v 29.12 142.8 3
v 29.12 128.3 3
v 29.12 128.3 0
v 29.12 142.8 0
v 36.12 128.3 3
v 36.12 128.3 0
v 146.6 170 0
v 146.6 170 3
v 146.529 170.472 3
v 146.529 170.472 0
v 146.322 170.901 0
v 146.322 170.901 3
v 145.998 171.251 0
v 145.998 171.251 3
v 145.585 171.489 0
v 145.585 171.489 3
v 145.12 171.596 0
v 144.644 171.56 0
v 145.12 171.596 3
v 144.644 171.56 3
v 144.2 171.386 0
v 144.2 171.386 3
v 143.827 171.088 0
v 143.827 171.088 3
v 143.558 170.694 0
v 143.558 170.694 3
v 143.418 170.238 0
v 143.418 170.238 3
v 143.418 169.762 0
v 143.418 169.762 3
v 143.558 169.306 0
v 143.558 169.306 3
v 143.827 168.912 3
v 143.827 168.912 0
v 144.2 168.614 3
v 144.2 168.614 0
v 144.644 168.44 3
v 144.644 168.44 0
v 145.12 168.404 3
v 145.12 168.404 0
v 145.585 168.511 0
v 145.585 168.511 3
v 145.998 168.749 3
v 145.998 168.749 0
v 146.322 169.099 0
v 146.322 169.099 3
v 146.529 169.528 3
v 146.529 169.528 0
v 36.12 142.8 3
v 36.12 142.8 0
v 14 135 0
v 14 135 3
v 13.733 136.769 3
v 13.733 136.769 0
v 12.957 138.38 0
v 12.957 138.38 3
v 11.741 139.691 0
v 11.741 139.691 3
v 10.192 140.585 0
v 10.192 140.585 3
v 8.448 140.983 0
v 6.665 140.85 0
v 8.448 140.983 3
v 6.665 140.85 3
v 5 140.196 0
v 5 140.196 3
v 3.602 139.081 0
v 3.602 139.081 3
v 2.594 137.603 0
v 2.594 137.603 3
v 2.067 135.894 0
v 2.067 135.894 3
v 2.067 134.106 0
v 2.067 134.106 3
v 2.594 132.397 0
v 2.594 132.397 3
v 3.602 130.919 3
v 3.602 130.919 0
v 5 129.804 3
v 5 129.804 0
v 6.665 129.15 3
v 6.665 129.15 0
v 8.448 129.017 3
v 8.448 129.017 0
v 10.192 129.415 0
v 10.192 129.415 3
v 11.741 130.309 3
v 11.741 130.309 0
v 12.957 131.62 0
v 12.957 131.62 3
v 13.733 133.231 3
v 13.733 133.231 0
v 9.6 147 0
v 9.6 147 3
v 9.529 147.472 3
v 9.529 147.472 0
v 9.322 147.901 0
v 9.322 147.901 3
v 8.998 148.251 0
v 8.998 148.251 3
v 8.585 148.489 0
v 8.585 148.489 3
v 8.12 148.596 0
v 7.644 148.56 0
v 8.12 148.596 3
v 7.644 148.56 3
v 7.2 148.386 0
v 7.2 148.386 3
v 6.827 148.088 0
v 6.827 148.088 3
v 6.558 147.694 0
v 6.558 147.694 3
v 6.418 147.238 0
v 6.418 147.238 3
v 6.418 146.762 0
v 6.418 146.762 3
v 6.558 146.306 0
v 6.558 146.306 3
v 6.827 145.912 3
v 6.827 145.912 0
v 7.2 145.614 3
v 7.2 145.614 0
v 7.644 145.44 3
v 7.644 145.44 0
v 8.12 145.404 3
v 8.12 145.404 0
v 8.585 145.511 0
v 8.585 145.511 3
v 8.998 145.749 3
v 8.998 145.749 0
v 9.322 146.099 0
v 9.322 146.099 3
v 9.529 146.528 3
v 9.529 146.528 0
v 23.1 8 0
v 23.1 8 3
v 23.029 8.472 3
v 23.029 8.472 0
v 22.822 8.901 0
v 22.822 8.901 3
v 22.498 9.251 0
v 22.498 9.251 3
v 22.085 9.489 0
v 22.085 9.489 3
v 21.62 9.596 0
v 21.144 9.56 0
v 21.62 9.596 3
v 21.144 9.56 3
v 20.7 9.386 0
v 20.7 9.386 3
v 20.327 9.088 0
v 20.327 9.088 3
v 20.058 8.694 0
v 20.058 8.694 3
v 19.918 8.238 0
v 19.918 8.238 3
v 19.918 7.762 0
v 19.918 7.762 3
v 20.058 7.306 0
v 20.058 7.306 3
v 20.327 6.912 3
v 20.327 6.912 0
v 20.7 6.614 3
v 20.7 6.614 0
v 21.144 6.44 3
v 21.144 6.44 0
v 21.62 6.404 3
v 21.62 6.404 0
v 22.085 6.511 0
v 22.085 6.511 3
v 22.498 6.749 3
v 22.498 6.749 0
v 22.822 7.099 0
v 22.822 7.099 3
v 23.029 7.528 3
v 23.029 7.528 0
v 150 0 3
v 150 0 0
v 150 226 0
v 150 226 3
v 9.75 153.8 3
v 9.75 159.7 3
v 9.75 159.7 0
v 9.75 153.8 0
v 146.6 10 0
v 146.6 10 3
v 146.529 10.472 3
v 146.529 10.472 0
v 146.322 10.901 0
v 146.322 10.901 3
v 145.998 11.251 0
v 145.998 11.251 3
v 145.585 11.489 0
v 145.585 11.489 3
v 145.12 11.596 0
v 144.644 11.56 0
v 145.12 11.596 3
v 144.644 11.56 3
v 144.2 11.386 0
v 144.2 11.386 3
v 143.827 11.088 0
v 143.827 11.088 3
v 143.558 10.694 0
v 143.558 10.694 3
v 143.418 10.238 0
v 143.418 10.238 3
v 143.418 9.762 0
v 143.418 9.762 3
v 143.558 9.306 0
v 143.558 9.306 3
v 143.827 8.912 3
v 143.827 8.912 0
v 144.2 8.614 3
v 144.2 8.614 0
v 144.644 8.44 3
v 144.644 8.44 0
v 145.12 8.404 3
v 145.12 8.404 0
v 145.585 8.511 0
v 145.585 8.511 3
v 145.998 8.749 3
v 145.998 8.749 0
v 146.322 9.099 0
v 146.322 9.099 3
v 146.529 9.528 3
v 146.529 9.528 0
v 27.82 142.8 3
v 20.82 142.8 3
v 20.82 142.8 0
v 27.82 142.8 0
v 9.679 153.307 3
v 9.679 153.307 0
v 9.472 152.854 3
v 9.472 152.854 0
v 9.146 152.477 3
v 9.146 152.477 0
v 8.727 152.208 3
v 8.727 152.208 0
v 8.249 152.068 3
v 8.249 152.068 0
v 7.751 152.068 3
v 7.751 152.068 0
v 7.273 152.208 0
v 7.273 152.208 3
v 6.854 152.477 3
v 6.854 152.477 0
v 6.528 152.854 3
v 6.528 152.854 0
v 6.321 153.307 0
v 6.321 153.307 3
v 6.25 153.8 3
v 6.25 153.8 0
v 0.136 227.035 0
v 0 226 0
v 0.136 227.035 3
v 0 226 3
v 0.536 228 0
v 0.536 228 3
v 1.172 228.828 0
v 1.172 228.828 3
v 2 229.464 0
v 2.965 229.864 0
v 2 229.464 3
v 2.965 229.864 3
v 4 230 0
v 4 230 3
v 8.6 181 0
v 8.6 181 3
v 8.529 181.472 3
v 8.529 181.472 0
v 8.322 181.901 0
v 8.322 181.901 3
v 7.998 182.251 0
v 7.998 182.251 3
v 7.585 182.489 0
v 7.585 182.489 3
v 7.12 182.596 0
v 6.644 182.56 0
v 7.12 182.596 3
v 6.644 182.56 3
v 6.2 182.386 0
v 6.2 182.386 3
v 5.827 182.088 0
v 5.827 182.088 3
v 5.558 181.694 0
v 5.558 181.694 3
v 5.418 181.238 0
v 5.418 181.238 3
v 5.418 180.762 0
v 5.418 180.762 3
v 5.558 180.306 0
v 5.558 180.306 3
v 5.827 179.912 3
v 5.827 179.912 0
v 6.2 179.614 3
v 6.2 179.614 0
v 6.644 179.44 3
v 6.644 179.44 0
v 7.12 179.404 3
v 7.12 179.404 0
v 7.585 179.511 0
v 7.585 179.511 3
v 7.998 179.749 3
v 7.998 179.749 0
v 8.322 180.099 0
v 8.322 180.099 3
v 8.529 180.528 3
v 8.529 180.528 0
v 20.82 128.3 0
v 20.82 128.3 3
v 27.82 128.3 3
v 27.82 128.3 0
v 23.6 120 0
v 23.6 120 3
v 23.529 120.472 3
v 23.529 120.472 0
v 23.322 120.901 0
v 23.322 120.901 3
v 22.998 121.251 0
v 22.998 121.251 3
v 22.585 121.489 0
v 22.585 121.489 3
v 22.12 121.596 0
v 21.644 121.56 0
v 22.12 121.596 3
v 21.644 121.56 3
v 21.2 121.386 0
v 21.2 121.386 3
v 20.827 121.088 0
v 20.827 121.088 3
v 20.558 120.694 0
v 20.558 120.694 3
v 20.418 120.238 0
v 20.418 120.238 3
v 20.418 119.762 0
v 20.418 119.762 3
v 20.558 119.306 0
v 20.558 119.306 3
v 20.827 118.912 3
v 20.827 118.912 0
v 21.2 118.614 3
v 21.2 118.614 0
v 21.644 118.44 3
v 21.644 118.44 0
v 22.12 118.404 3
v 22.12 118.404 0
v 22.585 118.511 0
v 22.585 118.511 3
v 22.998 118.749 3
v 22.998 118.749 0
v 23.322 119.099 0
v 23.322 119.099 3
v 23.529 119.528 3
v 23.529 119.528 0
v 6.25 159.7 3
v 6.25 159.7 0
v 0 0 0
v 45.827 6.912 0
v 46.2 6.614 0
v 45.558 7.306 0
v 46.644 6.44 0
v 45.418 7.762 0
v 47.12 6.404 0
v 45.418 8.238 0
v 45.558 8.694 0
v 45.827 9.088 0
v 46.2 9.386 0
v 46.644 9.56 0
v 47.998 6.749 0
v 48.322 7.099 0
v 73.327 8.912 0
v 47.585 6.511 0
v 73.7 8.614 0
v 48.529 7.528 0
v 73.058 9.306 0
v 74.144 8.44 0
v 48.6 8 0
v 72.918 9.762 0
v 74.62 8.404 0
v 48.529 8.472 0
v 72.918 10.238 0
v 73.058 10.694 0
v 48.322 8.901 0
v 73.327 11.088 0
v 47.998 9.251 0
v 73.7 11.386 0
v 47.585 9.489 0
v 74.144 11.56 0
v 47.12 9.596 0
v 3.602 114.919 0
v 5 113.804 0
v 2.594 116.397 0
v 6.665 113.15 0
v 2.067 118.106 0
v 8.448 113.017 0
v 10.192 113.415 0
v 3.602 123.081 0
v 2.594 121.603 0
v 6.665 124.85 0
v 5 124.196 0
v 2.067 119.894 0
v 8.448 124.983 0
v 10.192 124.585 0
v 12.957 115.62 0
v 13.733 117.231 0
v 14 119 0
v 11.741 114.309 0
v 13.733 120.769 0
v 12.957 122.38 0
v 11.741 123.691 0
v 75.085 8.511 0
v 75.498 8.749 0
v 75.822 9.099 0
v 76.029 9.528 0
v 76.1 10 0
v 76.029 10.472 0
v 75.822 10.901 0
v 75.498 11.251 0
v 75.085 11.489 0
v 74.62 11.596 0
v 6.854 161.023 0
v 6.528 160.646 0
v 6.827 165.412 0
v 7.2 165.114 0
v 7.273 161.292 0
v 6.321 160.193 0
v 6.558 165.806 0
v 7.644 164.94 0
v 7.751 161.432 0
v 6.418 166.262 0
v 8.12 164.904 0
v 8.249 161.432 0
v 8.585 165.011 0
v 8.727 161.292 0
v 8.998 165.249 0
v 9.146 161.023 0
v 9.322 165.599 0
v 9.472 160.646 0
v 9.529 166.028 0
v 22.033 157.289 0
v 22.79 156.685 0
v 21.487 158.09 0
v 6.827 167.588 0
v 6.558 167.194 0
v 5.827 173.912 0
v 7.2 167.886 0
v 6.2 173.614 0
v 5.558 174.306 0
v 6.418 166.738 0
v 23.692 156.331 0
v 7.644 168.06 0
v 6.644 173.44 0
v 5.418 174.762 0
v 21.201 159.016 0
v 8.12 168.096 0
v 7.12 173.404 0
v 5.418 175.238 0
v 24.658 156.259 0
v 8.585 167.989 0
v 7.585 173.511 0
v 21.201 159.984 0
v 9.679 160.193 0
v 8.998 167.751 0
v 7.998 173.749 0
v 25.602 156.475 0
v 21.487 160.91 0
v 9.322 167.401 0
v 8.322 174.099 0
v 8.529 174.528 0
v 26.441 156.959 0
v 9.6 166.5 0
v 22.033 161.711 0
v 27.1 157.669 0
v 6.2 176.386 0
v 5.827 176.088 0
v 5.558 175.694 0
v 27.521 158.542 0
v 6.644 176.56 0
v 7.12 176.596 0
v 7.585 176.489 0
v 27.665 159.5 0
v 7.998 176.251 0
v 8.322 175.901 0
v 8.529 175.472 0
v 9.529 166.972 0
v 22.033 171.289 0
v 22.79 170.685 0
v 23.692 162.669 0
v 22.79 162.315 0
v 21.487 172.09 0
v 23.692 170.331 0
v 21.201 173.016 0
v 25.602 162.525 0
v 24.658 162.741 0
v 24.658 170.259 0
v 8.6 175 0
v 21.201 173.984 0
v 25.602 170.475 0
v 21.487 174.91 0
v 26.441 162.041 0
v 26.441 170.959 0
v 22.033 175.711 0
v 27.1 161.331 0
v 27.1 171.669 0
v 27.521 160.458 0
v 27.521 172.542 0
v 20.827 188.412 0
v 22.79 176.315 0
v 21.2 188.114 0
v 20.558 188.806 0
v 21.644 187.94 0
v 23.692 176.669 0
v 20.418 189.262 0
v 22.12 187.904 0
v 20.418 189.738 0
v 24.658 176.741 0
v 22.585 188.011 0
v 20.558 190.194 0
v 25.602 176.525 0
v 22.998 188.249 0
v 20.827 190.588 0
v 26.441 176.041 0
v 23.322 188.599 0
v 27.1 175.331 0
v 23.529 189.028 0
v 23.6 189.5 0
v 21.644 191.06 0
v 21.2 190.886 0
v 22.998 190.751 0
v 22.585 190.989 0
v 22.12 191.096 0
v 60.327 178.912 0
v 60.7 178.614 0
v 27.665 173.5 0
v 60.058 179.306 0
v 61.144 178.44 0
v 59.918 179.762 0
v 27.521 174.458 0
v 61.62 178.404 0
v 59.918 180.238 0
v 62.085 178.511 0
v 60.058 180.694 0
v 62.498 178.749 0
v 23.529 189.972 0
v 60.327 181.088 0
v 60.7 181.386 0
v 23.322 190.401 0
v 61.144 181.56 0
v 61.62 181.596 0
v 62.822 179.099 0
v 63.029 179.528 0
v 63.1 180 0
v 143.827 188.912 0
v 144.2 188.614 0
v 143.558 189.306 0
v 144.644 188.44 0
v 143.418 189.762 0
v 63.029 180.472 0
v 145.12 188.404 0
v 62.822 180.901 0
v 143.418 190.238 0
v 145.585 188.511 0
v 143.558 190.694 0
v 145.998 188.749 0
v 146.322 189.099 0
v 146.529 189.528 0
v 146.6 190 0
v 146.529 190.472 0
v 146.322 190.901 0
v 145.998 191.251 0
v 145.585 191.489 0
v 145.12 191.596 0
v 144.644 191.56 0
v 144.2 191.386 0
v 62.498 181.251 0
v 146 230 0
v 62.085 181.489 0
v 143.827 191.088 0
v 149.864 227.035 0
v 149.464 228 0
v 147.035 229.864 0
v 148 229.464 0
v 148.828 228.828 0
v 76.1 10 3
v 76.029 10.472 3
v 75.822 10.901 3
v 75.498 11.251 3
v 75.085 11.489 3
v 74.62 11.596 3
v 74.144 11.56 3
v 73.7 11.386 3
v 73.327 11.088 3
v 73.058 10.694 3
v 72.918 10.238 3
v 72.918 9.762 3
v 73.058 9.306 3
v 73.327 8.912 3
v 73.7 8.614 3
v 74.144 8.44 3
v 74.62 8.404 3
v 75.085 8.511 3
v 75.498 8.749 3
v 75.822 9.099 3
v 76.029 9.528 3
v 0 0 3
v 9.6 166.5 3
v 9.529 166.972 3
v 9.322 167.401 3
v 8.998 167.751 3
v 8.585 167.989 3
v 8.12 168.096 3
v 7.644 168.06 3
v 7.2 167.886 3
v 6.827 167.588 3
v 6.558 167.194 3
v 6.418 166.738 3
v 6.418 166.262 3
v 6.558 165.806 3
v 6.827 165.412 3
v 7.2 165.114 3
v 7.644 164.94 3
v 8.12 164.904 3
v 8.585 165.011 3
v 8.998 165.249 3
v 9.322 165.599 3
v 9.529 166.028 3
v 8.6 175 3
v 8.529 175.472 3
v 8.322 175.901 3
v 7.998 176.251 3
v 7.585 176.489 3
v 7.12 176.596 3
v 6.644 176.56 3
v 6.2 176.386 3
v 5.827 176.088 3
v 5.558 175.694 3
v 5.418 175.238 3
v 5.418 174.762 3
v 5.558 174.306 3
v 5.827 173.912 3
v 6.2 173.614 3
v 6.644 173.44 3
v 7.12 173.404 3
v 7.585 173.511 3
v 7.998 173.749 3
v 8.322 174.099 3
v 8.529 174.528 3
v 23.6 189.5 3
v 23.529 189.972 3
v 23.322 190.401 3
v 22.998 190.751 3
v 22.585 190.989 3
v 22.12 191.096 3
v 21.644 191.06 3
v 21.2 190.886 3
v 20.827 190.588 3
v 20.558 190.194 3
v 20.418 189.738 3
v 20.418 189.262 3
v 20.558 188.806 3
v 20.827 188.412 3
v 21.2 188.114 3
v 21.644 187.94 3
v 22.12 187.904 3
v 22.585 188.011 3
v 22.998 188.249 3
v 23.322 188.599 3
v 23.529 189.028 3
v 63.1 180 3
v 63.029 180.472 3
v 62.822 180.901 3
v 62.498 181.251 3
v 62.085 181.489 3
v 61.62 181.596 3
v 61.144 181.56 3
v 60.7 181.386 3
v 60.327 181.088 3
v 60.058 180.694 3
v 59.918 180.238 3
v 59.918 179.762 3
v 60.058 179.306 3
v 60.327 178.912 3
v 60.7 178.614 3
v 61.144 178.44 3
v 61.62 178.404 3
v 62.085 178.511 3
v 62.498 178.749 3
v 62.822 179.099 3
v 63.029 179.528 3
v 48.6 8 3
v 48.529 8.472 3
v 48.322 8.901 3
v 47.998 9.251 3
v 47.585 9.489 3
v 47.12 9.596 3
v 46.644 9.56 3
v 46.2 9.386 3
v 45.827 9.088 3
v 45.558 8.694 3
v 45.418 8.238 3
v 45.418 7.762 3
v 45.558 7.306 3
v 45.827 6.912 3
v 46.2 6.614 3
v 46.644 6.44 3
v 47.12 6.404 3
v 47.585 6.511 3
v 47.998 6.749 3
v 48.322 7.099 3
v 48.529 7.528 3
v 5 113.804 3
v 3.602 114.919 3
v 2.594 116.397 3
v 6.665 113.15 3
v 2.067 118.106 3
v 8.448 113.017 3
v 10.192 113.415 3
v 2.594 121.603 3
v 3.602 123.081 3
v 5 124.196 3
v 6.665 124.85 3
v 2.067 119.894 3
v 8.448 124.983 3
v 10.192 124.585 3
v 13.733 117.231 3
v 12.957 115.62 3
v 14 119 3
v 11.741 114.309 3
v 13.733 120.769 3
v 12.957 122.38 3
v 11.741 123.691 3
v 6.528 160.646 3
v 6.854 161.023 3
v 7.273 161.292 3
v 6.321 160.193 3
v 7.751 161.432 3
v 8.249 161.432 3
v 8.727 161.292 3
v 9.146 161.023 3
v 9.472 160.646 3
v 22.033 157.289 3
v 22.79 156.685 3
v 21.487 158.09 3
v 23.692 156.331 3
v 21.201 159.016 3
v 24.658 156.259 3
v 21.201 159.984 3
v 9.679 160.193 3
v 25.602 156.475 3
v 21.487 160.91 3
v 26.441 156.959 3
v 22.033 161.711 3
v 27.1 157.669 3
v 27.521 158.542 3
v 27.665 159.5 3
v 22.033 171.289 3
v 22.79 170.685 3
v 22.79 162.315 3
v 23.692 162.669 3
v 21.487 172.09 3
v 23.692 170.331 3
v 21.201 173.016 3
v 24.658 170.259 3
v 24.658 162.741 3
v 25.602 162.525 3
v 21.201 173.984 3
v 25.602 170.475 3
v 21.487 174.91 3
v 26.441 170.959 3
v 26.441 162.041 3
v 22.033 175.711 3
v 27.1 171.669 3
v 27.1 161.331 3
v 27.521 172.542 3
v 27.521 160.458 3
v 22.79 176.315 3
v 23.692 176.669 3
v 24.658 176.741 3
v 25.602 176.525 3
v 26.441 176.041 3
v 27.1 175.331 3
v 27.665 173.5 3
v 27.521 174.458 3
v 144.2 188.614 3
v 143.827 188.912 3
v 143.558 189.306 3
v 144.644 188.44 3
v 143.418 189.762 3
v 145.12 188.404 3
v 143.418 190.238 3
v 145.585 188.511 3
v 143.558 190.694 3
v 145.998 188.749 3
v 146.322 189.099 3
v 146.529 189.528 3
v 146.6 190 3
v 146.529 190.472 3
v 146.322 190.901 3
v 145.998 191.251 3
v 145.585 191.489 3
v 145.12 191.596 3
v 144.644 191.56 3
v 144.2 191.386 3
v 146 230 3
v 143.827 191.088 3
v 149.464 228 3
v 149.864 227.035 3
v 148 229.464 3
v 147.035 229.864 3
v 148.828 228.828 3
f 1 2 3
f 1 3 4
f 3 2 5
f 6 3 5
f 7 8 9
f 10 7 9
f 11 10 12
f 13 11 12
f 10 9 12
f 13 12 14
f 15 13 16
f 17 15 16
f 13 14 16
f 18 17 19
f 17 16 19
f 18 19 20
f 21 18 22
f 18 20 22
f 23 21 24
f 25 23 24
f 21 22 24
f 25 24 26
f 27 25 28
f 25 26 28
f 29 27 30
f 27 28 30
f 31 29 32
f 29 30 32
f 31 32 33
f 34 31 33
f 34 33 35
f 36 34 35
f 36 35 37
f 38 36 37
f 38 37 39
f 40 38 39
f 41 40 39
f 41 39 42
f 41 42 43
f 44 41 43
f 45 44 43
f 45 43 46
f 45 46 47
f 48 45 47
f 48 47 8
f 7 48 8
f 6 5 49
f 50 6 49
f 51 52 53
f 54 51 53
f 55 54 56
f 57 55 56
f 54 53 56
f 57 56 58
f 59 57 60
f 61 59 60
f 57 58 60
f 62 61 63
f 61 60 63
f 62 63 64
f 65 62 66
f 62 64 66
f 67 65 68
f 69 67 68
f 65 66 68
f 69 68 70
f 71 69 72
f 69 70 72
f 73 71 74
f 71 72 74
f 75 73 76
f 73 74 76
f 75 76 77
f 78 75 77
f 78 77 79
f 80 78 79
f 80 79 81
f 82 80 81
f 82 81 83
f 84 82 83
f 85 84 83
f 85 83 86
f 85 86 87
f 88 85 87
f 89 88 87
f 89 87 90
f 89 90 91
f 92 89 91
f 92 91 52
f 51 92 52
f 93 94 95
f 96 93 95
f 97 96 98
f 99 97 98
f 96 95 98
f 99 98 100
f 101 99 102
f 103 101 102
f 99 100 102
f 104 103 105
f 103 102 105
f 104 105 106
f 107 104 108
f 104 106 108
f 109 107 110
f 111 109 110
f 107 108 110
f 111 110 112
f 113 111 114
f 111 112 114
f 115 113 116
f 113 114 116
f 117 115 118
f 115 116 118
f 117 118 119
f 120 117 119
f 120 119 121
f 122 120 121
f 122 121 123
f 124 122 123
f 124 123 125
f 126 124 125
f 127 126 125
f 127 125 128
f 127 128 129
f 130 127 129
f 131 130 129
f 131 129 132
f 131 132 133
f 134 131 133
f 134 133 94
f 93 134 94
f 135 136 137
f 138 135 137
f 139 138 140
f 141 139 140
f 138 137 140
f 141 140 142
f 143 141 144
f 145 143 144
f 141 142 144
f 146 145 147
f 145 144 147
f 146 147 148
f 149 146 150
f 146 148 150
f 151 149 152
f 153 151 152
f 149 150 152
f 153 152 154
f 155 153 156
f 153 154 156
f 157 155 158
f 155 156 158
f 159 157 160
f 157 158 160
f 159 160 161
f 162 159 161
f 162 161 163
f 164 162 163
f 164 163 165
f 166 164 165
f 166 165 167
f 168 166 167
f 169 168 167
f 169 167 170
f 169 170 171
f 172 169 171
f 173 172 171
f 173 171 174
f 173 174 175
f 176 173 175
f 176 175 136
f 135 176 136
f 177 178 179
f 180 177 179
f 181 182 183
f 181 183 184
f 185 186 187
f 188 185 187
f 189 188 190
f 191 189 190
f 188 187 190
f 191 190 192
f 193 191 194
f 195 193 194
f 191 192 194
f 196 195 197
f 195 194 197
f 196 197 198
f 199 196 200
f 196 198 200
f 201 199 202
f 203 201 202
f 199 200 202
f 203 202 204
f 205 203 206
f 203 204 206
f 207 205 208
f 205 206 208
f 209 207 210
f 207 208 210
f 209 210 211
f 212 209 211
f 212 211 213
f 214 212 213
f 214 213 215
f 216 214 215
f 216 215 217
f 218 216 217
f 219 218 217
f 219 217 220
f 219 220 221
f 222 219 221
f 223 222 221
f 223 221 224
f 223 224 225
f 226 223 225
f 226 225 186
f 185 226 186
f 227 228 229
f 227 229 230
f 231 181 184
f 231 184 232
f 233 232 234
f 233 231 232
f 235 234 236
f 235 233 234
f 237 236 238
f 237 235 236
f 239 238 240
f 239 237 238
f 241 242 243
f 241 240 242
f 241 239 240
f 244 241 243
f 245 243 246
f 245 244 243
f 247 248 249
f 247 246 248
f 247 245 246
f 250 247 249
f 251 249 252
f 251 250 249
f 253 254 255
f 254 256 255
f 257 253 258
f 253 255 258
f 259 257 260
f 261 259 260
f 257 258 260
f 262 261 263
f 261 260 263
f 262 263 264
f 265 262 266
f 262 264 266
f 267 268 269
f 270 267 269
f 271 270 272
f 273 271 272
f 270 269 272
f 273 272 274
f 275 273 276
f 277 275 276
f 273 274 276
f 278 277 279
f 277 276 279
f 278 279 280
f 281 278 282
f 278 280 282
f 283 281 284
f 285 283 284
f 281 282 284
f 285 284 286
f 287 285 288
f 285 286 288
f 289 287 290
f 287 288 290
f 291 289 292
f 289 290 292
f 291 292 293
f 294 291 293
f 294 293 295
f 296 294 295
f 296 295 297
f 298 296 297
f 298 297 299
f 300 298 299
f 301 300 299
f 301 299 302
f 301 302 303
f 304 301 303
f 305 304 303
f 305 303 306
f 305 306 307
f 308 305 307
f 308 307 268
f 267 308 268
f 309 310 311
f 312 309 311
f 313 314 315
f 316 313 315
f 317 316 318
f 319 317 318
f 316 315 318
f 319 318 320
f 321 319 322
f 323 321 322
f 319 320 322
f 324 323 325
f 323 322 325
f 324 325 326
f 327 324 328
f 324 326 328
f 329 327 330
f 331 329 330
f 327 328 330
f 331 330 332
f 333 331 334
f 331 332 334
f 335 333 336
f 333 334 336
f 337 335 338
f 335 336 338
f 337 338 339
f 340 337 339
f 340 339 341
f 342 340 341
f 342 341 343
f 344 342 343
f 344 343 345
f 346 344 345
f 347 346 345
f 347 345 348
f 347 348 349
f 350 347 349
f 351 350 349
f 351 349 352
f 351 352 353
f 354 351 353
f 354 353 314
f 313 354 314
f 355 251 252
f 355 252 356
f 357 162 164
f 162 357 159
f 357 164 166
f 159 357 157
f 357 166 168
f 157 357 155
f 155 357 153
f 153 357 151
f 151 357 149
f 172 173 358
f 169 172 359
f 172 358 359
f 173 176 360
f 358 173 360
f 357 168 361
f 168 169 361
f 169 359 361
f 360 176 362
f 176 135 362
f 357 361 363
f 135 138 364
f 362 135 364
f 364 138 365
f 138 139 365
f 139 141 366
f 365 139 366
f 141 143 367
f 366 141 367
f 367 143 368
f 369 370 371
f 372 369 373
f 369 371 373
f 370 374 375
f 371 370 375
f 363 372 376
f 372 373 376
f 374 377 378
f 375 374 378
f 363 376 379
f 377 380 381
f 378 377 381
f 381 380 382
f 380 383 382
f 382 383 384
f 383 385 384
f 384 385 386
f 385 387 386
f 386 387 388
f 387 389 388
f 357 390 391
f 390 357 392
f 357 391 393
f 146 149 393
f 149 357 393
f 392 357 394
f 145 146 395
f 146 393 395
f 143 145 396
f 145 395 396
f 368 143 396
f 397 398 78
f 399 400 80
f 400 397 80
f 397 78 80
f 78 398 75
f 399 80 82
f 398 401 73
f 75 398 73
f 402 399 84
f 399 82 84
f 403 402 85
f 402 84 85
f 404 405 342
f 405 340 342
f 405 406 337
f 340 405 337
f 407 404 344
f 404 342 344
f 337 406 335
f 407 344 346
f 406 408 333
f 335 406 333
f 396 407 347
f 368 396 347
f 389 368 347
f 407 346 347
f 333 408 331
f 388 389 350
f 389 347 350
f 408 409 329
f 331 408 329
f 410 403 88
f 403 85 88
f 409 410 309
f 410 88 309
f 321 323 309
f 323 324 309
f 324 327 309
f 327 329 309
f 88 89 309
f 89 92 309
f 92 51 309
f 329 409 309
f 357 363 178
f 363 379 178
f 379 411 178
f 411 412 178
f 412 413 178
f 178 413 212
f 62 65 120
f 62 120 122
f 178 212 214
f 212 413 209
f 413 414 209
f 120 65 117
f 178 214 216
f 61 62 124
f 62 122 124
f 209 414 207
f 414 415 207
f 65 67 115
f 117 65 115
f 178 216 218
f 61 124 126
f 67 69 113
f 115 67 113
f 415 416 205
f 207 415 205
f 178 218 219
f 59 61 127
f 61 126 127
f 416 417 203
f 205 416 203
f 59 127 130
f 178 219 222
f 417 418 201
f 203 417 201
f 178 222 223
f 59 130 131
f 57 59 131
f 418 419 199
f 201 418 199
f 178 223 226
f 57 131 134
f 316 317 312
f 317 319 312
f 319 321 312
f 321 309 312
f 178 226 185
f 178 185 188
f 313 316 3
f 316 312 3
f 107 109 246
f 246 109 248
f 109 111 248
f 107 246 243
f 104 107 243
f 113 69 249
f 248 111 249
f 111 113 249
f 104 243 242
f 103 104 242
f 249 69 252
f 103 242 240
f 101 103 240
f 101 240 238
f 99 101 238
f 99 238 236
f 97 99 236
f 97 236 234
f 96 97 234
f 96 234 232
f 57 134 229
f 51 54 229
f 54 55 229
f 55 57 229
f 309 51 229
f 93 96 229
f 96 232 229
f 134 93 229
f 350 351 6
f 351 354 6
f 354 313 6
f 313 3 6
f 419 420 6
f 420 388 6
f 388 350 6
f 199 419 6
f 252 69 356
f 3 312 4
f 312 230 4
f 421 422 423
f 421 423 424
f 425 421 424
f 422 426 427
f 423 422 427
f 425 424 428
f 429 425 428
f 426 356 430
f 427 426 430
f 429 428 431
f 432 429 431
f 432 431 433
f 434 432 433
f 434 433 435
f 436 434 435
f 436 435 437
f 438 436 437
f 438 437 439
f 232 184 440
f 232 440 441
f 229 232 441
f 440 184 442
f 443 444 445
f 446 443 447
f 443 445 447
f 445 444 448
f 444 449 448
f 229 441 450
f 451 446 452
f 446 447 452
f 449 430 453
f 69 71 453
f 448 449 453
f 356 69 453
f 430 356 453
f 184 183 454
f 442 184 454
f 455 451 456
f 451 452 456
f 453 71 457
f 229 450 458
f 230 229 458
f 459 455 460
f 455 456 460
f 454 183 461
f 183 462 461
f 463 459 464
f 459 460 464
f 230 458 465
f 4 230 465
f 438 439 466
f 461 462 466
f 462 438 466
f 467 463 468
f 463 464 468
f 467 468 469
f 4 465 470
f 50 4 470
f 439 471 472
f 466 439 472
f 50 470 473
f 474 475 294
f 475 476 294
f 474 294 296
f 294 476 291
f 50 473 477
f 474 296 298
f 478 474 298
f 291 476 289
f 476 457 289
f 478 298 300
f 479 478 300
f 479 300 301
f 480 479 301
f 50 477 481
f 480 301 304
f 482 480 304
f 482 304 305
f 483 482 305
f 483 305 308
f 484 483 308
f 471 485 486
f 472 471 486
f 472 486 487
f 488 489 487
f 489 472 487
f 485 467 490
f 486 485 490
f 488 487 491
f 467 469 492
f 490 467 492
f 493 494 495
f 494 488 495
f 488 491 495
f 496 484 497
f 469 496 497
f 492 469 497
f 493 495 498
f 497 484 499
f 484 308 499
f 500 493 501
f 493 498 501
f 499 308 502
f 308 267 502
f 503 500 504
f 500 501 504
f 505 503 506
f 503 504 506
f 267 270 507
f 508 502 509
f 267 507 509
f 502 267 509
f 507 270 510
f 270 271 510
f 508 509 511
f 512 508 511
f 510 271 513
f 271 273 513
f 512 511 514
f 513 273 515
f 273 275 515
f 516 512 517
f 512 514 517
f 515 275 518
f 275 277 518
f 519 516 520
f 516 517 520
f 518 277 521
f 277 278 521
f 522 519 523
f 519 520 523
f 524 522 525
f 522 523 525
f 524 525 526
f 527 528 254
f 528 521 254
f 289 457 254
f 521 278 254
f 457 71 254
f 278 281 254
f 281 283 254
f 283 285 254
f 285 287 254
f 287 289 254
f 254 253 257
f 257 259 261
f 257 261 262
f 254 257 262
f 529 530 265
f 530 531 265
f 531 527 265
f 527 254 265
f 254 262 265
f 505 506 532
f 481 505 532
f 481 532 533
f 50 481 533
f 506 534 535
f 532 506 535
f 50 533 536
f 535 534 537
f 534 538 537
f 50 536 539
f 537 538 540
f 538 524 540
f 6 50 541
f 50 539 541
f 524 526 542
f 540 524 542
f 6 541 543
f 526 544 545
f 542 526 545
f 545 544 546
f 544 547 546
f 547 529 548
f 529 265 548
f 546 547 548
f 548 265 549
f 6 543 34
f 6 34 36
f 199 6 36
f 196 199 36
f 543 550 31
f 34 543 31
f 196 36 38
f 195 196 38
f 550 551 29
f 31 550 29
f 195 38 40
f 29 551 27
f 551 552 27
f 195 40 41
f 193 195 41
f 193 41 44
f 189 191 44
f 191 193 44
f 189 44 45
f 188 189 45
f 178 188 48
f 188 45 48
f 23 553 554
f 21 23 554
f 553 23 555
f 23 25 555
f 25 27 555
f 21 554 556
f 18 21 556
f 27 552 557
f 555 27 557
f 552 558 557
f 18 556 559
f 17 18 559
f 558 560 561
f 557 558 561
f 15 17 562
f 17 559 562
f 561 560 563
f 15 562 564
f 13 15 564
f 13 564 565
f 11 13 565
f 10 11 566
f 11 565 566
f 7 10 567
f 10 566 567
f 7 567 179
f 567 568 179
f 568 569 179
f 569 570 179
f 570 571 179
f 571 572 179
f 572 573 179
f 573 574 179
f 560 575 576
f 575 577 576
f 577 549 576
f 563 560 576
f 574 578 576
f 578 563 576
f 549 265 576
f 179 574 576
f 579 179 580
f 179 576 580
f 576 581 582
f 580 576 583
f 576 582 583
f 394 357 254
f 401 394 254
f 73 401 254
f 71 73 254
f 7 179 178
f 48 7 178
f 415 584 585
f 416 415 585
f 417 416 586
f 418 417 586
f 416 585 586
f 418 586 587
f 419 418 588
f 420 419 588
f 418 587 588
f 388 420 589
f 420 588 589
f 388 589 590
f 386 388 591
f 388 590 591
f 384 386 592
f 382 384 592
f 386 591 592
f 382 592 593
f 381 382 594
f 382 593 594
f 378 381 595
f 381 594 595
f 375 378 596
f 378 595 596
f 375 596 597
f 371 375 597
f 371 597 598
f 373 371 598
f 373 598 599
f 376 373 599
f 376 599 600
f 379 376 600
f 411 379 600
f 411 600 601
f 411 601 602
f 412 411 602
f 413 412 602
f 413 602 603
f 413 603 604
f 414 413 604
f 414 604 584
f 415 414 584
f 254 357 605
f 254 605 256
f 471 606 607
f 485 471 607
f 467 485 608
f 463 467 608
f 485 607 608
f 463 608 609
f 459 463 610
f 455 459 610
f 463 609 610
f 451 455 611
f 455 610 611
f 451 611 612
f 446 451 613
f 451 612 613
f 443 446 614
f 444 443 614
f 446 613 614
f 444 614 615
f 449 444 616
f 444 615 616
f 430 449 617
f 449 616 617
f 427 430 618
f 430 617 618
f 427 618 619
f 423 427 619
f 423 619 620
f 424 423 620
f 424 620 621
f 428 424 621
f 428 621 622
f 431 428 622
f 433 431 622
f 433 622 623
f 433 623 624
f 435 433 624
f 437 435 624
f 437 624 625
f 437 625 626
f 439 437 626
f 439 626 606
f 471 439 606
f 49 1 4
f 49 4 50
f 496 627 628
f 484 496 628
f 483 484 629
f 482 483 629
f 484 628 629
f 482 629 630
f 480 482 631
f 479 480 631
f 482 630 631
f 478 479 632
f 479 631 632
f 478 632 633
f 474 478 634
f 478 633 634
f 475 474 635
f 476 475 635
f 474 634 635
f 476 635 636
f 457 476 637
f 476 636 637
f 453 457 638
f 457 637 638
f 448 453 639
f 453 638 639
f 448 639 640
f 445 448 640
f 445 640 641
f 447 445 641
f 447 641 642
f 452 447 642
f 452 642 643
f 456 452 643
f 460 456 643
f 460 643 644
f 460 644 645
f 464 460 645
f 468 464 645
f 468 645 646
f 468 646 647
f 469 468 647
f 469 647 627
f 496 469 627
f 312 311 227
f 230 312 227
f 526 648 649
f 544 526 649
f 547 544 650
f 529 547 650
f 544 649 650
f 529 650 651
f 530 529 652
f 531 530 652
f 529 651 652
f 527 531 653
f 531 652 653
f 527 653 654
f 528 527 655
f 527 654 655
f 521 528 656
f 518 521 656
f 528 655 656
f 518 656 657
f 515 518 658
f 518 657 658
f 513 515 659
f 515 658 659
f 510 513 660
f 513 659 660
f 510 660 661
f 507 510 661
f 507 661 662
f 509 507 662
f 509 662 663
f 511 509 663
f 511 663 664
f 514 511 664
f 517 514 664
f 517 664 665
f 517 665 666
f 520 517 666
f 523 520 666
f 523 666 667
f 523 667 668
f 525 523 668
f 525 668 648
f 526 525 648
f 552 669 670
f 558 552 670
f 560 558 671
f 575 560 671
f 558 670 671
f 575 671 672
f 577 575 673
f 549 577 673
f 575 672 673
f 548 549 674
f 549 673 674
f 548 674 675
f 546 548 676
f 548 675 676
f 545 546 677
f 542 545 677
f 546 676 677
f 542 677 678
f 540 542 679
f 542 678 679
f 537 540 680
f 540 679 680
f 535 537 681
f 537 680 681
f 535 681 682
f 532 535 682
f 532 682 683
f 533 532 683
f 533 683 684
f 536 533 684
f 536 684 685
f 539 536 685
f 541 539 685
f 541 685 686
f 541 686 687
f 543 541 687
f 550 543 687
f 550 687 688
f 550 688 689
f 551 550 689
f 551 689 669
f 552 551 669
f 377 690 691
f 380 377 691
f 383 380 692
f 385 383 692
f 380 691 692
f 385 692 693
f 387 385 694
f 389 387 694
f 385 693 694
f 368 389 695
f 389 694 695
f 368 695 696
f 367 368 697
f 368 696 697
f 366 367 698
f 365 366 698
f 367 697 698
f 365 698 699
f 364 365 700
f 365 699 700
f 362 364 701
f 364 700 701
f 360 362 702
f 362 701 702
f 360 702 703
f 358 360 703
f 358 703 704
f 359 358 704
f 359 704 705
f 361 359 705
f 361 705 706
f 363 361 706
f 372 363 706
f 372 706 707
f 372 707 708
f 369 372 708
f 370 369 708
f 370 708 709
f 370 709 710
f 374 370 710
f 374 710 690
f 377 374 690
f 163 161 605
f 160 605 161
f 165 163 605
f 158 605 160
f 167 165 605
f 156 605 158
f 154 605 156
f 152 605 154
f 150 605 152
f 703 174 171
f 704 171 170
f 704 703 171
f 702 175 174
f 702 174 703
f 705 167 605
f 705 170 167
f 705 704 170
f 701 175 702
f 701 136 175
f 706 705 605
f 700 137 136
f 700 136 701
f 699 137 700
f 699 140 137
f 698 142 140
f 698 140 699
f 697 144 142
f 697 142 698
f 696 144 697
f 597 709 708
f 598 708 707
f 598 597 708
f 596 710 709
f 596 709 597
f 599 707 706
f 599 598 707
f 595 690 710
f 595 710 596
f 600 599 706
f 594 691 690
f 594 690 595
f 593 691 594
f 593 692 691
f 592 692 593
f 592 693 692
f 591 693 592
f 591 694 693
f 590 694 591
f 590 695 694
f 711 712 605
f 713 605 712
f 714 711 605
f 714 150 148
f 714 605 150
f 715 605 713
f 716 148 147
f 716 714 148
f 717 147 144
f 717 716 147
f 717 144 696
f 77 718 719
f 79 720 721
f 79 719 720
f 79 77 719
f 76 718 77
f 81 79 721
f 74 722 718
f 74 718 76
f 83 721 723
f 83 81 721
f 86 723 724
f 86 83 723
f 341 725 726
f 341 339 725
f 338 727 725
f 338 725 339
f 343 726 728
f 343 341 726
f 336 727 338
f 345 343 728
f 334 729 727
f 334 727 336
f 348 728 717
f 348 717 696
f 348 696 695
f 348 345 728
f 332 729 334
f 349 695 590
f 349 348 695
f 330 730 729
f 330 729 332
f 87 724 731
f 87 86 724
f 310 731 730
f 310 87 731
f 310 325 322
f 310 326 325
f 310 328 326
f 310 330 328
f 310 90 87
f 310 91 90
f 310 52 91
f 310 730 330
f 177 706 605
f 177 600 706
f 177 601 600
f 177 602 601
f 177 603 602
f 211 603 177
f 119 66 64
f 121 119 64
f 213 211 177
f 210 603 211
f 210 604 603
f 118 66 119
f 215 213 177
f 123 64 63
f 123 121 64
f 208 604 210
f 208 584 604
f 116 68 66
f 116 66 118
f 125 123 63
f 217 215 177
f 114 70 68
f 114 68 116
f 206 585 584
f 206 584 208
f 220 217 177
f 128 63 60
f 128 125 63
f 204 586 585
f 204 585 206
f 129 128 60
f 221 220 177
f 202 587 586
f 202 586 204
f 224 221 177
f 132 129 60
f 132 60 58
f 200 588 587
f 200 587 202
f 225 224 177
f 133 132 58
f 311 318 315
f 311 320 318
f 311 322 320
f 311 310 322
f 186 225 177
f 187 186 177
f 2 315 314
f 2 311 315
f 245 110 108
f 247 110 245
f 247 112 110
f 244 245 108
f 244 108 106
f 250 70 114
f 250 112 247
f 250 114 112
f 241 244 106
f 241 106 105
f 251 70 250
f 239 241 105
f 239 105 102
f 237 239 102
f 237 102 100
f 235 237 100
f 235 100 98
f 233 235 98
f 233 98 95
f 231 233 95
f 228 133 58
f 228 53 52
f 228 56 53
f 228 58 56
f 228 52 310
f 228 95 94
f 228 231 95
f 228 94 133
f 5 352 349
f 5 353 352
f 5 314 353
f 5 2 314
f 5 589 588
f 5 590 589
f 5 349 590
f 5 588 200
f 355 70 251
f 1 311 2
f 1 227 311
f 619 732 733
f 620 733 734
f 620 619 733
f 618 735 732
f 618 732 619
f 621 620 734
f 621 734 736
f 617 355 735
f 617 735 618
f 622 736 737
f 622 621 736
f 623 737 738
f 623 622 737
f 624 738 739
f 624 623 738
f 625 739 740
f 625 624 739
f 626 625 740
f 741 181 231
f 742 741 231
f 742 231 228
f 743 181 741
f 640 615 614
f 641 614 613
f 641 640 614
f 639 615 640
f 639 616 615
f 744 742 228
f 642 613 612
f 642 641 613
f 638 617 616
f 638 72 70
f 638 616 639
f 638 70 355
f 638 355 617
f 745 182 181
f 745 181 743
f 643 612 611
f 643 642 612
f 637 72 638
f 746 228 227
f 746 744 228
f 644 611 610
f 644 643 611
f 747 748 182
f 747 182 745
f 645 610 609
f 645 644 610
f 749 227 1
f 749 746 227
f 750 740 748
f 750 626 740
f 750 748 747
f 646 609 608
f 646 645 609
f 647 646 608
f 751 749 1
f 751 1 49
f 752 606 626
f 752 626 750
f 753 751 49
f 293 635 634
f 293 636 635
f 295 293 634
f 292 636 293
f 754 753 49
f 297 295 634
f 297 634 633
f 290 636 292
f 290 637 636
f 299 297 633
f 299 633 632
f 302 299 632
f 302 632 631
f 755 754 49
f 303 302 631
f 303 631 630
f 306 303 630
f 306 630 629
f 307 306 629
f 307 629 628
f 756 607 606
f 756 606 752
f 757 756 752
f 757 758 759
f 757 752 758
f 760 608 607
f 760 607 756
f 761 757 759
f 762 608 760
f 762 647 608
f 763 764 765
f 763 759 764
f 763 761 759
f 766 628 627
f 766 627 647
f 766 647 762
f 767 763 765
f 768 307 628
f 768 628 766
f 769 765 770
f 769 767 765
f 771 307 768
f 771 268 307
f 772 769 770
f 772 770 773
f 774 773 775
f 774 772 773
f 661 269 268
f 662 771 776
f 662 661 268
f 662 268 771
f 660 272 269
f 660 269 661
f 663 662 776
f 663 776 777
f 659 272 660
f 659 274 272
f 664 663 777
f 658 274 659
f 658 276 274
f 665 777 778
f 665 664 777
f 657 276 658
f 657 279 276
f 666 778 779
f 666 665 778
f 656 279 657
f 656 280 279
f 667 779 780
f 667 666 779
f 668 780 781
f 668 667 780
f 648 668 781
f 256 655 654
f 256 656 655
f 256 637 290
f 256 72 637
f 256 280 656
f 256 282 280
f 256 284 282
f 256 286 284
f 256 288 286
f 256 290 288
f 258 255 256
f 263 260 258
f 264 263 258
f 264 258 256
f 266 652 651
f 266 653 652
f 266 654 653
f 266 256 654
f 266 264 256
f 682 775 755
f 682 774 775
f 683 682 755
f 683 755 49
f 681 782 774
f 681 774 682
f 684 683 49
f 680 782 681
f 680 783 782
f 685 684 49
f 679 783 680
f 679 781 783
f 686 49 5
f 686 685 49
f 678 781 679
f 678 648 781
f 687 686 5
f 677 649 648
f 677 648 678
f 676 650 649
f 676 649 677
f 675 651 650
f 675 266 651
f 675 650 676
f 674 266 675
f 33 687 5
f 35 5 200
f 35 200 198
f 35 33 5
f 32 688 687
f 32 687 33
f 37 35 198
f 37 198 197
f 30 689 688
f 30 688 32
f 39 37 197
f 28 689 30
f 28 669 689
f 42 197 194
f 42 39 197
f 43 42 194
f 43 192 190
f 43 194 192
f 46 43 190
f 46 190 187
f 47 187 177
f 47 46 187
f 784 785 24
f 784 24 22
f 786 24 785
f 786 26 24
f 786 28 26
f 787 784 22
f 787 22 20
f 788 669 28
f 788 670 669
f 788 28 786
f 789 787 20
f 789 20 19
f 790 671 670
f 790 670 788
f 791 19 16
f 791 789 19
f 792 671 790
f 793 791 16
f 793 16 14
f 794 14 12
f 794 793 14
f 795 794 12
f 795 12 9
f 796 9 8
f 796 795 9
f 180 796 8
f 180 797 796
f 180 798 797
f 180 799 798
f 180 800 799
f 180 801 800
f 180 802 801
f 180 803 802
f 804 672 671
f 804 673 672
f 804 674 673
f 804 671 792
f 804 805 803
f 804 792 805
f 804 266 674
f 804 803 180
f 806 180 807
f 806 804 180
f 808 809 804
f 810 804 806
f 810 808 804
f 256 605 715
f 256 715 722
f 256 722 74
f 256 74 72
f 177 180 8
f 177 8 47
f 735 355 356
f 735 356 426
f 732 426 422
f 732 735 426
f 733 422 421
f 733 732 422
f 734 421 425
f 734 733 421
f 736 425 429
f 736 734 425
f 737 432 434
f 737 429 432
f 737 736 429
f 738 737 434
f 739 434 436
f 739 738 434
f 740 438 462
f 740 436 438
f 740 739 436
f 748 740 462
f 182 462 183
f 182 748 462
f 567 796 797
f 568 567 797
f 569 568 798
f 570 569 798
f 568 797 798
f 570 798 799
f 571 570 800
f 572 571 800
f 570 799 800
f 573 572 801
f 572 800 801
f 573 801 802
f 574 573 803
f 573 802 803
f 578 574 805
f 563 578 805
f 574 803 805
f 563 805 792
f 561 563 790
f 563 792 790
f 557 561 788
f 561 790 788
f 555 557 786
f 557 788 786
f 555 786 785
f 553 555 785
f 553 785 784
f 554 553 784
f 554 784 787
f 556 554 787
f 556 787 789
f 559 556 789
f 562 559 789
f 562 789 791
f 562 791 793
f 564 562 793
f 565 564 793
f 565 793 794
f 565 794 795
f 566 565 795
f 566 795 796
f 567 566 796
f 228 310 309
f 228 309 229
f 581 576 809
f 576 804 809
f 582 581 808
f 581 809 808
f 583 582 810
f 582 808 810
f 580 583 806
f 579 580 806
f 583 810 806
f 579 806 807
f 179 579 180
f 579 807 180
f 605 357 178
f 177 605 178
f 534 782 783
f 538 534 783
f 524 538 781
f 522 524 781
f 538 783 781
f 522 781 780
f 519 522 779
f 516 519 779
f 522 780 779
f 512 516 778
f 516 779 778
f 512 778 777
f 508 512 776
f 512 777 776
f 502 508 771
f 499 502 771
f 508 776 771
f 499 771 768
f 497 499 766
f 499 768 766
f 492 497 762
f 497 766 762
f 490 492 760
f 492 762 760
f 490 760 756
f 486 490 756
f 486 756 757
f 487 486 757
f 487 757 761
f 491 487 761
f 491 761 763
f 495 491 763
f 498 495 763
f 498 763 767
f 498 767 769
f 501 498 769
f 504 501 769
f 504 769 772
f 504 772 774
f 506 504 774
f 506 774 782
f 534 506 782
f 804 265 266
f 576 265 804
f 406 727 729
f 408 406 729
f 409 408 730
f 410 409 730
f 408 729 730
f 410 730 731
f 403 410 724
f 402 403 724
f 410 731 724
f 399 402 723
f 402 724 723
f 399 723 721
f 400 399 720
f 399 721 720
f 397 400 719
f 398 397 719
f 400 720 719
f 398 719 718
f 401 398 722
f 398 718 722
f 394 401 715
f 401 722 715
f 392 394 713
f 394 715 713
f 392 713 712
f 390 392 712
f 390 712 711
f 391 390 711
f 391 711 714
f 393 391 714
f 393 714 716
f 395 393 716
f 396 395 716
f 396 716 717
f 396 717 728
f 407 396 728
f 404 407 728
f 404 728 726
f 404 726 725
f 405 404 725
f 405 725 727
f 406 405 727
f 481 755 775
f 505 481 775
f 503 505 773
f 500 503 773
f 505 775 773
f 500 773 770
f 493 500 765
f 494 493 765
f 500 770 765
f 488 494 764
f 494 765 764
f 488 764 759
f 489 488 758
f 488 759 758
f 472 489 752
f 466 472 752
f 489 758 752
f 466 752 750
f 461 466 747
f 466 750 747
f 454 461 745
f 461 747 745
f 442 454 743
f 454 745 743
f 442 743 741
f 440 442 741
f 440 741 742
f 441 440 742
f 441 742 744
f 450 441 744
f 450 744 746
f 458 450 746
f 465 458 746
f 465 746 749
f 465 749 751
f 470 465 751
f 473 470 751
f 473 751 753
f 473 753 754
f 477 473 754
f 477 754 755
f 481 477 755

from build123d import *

# Parameters (mm, degrees)
SKETCH_1_W          = 150
SKETCH_1_H          = 230
EXTRUDE_1_DEPTH     = 3
CUT_EXTRUDE_1_REACH = 276.607
SKETCH_2_R          = 1.6
FILLET_1_R          = 4
CUT_EXTRUDE_2_REACH = 276.607
SKETCH_3_R          = 6
SKETCH_3_R_2        = 1.6
CUT_EXTRUDE_3_REACH = 276.607
SKETCH_4_R          = 1.6
SKETCH_4_R_2        = 3.25
SKETCH_4_W          = 7
SKETCH_4_H          = 14.5


with BuildPart() as part:
    # 草图1 → 凸台-拉伸1 (new body)
    with BuildSketch(Plane.XY):
        with Locations((75, 115)):
            Rectangle(SKETCH_1_W, SKETCH_1_H)
    extrude(amount=EXTRUDE_1_DEPTH)

    # 草图2 → 切除-拉伸1 (cut, up to next)
    with BuildSketch(Plane.XY.offset(3), mode=Mode.PRIVATE) as cut_extrude_1_sk1:
        with Locations((21.5, 8)):
            Circle(SKETCH_2_R)
    cut_extrude_1_tool1 = extrude(cut_extrude_1_sk1.sketch, amount=-CUT_EXTRUDE_1_REACH, mode=Mode.PRIVATE) & part.part
    # 草图2 → 切除-拉伸1 (cut, up to next)
    with BuildSketch(Plane.XY.offset(3), mode=Mode.PRIVATE) as cut_extrude_1_sk2:
        with Locations((47, 8)):
            Circle(SKETCH_2_R)
    cut_extrude_1_tool2 = extrude(cut_extrude_1_sk2.sketch, amount=-CUT_EXTRUDE_1_REACH, mode=Mode.PRIVATE) & part.part
    # 草图2 → 切除-拉伸1 (cut, up to next)
    with BuildSketch(Plane.XY.offset(3), mode=Mode.PRIVATE) as cut_extrude_1_sk3:
        with Locations((74.5, 10)):
            Circle(SKETCH_2_R)
    cut_extrude_1_tool3 = extrude(cut_extrude_1_sk3.sketch, amount=-CUT_EXTRUDE_1_REACH, mode=Mode.PRIVATE) & part.part
    # 草图2 → 切除-拉伸1 (cut, up to next)
    with BuildSketch(Plane.XY.offset(3), mode=Mode.PRIVATE) as cut_extrude_1_sk4:
        with Locations((145, 10)):
            Circle(SKETCH_2_R)
    cut_extrude_1_tool4 = extrude(cut_extrude_1_sk4.sketch, amount=-CUT_EXTRUDE_1_REACH, mode=Mode.PRIVATE) & part.part
    # 草图2 → 切除-拉伸1 (cut, up to next)
    with BuildSketch(Plane.XY.offset(3), mode=Mode.PRIVATE) as cut_extrude_1_sk5:
        with Locations((61.5, 180)):
            Circle(SKETCH_2_R)
    cut_extrude_1_tool5 = extrude(cut_extrude_1_sk5.sketch, amount=-CUT_EXTRUDE_1_REACH, mode=Mode.PRIVATE) & part.part
    # 草图2 → 切除-拉伸1 (cut, up to next)
    with BuildSketch(Plane.XY.offset(3), mode=Mode.PRIVATE) as cut_extrude_1_sk6:
        with Locations((145, 190)):
            Circle(SKETCH_2_R)
    cut_extrude_1_tool6 = extrude(cut_extrude_1_sk6.sketch, amount=-CUT_EXTRUDE_1_REACH, mode=Mode.PRIVATE) & part.part
    # 草图2 → 切除-拉伸1 (cut, up to next)
    with BuildSketch(Plane.XY.offset(3), mode=Mode.PRIVATE) as cut_extrude_1_sk7:
        with Locations((145, 170)):
            Circle(SKETCH_2_R)
    cut_extrude_1_tool7 = extrude(cut_extrude_1_sk7.sketch, amount=-CUT_EXTRUDE_1_REACH, mode=Mode.PRIVATE) & part.part
    # 草图2 → 切除-拉伸1 (cut, up to next)
    with BuildSketch(Plane.XY.offset(3), mode=Mode.PRIVATE) as cut_extrude_1_sk8:
        with Locations((7, 181)):
            Circle(SKETCH_2_R)
    cut_extrude_1_tool8 = extrude(cut_extrude_1_sk8.sketch, amount=-CUT_EXTRUDE_1_REACH, mode=Mode.PRIVATE) & part.part
    # 草图2 → 切除-拉伸1 (cut, up to next)
    with BuildSketch(Plane.XY.offset(3), mode=Mode.PRIVATE) as cut_extrude_1_sk9:
        with Locations((7, 175)):
            Circle(SKETCH_2_R)
    cut_extrude_1_tool9 = extrude(cut_extrude_1_sk9.sketch, amount=-CUT_EXTRUDE_1_REACH, mode=Mode.PRIVATE) & part.part
    add(cut_extrude_1_tool1.solids().sort_by_distance((21.5, 8, 3))[0], mode=Mode.SUBTRACT)
    add(cut_extrude_1_tool2.solids().sort_by_distance((47, 8, 3))[0], mode=Mode.SUBTRACT)
    add(cut_extrude_1_tool3.solids().sort_by_distance((74.5, 10, 3))[0], mode=Mode.SUBTRACT)
    add(cut_extrude_1_tool4.solids().sort_by_distance((145, 10, 3))[0], mode=Mode.SUBTRACT)
    add(cut_extrude_1_tool5.solids().sort_by_distance((61.5, 180, 3))[0], mode=Mode.SUBTRACT)
    add(cut_extrude_1_tool6.solids().sort_by_distance((145, 190, 3))[0], mode=Mode.SUBTRACT)
    add(cut_extrude_1_tool7.solids().sort_by_distance((145, 170, 3))[0], mode=Mode.SUBTRACT)
    add(cut_extrude_1_tool8.solids().sort_by_distance((7, 181, 3))[0], mode=Mode.SUBTRACT)
    add(cut_extrude_1_tool9.solids().sort_by_distance((7, 175, 3))[0], mode=Mode.SUBTRACT)

    # 圆角1
    fillet_1_edges = [part.edges().sort_by_distance(p)[0] for p in [
        (0, 230, 1.5),
        (150, 230, 1.5),
    ]]
    fillet(fillet_1_edges, radius=FILLET_1_R)

    # 草图3 → 切除-拉伸2 (cut, up to next)
    with BuildSketch(Plane.XY.offset(3), mode=Mode.PRIVATE) as cut_extrude_2_sk1:
        with Locations((8, 135)):
            Circle(SKETCH_3_R)
    cut_extrude_2_tool1 = extrude(cut_extrude_2_sk1.sketch, amount=-CUT_EXTRUDE_2_REACH, mode=Mode.PRIVATE) & part.part
    # 草图3 → 切除-拉伸2 (cut, up to next)
    with BuildSketch(Plane.XY.offset(3), mode=Mode.PRIVATE) as cut_extrude_2_sk2:
        with Locations((8, 119)):
            Circle(SKETCH_3_R)
    cut_extrude_2_tool2 = extrude(cut_extrude_2_sk2.sketch, amount=-CUT_EXTRUDE_2_REACH, mode=Mode.PRIVATE) & part.part
    # 草图3 → 切除-拉伸2 (cut, up to next)
    with BuildSketch(Plane.XY.offset(3), mode=Mode.PRIVATE) as cut_extrude_2_sk3:
        with Locations((8, 166.5)):
            Circle(SKETCH_3_R_2)
    cut_extrude_2_tool3 = extrude(cut_extrude_2_sk3.sketch, amount=-CUT_EXTRUDE_2_REACH, mode=Mode.PRIVATE) & part.part
    # 草图3 → 切除-拉伸2 (cut, up to next)
    with BuildSketch(Plane.XY.offset(3), mode=Mode.PRIVATE) as cut_extrude_2_sk4:
        with Locations((8, 147)):
            Circle(SKETCH_3_R_2)
    cut_extrude_2_tool4 = extrude(cut_extrude_2_sk4.sketch, amount=-CUT_EXTRUDE_2_REACH, mode=Mode.PRIVATE) & part.part
    # 草图3 → 切除-拉伸2 (cut, up to next)
    with BuildSketch(Plane.XY.offset(3), mode=Mode.PRIVATE) as cut_extrude_2_sk5:
        with BuildLine():
            Line((6.25, 153.8), (6.25, 159.7))
            ThreePointArc((6.25, 159.7), (8, 161.45), (9.75, 159.7))
            Line((9.75, 159.7), (9.75, 153.8))
            ThreePointArc((9.75, 153.8), (8, 152.05), (6.25, 153.8))
        make_face()
    cut_extrude_2_tool5 = extrude(cut_extrude_2_sk5.sketch, amount=-CUT_EXTRUDE_2_REACH, mode=Mode.PRIVATE) & part.part
    add(cut_extrude_2_tool1.solids().sort_by_distance((8, 135, 3))[0], mode=Mode.SUBTRACT)
    add(cut_extrude_2_tool2.solids().sort_by_distance((8, 119, 3))[0], mode=Mode.SUBTRACT)
    add(cut_extrude_2_tool3.solids().sort_by_distance((8, 166.5, 3))[0], mode=Mode.SUBTRACT)
    add(cut_extrude_2_tool4.solids().sort_by_distance((8, 147, 3))[0], mode=Mode.SUBTRACT)
    add(cut_extrude_2_tool5.solids().sort_by_distance((8, 156.75, 3))[0], mode=Mode.SUBTRACT)

    # 草图4 → 切除-拉伸3 (cut, up to next)
    with BuildSketch(Plane.XY.offset(3), mode=Mode.PRIVATE) as cut_extrude_3_sk1:
        with Locations((22, 120)):
            Circle(SKETCH_4_R)
    cut_extrude_3_tool1 = extrude(cut_extrude_3_sk1.sketch, amount=-CUT_EXTRUDE_3_REACH, mode=Mode.PRIVATE) & part.part
    # 草图4 → 切除-拉伸3 (cut, up to next)
    with BuildSketch(Plane.XY.offset(3), mode=Mode.PRIVATE) as cut_extrude_3_sk2:
        with Locations((22, 189.5)):
            Circle(SKETCH_4_R)
    cut_extrude_3_tool2 = extrude(cut_extrude_3_sk2.sketch, amount=-CUT_EXTRUDE_3_REACH, mode=Mode.PRIVATE) & part.part
    # 草图4 → 切除-拉伸3 (cut, up to next)
    with BuildSketch(Plane.XY.offset(3), mode=Mode.PRIVATE) as cut_extrude_3_sk3:
        with Locations((24.415, 173.5)):
            Circle(SKETCH_4_R_2)
    cut_extrude_3_tool3 = extrude(cut_extrude_3_sk3.sketch, amount=-CUT_EXTRUDE_3_REACH, mode=Mode.PRIVATE) & part.part
    # 草图4 → 切除-拉伸3 (cut, up to next)
    with BuildSketch(Plane.XY.offset(3), mode=Mode.PRIVATE) as cut_extrude_3_sk4:
        with Locations((24.415, 159.5)):
            Circle(SKETCH_4_R_2)
    cut_extrude_3_tool4 = extrude(cut_extrude_3_sk4.sketch, amount=-CUT_EXTRUDE_3_REACH, mode=Mode.PRIVATE) & part.part
    # 草图4 → 切除-拉伸3 (cut, up to next)
    with BuildSketch(Plane.XY.offset(3), mode=Mode.PRIVATE) as cut_extrude_3_sk5:
        with Locations((24.32, 135.55)):
            Rectangle(SKETCH_4_W, SKETCH_4_H)
    cut_extrude_3_tool5 = extrude(cut_extrude_3_sk5.sketch, amount=-CUT_EXTRUDE_3_REACH, mode=Mode.PRIVATE) & part.part
    # 草图4 → 切除-拉伸3 (cut, up to next)
    with BuildSketch(Plane.XY.offset(3), mode=Mode.PRIVATE) as cut_extrude_3_sk6:
        with Locations((32.62, 135.55)):
            Rectangle(SKETCH_4_W, SKETCH_4_H)
    cut_extrude_3_tool6 = extrude(cut_extrude_3_sk6.sketch, amount=-CUT_EXTRUDE_3_REACH, mode=Mode.PRIVATE) & part.part
    add(cut_extrude_3_tool1.solids().sort_by_distance((22, 120, 3))[0], mode=Mode.SUBTRACT)
    add(cut_extrude_3_tool2.solids().sort_by_distance((22, 189.5, 3))[0], mode=Mode.SUBTRACT)
    add(cut_extrude_3_tool3.solids().sort_by_distance((24.415, 173.5, 3))[0], mode=Mode.SUBTRACT)
    add(cut_extrude_3_tool4.solids().sort_by_distance((24.415, 159.5, 3))[0], mode=Mode.SUBTRACT)
    add(cut_extrude_3_tool5.solids().sort_by_distance((24.32, 135.55, 3))[0], mode=Mode.SUBTRACT)
    add(cut_extrude_3_tool6.solids().sort_by_distance((32.62, 135.55, 3))[0], mode=Mode.SUBTRACT)


solid = part.part
